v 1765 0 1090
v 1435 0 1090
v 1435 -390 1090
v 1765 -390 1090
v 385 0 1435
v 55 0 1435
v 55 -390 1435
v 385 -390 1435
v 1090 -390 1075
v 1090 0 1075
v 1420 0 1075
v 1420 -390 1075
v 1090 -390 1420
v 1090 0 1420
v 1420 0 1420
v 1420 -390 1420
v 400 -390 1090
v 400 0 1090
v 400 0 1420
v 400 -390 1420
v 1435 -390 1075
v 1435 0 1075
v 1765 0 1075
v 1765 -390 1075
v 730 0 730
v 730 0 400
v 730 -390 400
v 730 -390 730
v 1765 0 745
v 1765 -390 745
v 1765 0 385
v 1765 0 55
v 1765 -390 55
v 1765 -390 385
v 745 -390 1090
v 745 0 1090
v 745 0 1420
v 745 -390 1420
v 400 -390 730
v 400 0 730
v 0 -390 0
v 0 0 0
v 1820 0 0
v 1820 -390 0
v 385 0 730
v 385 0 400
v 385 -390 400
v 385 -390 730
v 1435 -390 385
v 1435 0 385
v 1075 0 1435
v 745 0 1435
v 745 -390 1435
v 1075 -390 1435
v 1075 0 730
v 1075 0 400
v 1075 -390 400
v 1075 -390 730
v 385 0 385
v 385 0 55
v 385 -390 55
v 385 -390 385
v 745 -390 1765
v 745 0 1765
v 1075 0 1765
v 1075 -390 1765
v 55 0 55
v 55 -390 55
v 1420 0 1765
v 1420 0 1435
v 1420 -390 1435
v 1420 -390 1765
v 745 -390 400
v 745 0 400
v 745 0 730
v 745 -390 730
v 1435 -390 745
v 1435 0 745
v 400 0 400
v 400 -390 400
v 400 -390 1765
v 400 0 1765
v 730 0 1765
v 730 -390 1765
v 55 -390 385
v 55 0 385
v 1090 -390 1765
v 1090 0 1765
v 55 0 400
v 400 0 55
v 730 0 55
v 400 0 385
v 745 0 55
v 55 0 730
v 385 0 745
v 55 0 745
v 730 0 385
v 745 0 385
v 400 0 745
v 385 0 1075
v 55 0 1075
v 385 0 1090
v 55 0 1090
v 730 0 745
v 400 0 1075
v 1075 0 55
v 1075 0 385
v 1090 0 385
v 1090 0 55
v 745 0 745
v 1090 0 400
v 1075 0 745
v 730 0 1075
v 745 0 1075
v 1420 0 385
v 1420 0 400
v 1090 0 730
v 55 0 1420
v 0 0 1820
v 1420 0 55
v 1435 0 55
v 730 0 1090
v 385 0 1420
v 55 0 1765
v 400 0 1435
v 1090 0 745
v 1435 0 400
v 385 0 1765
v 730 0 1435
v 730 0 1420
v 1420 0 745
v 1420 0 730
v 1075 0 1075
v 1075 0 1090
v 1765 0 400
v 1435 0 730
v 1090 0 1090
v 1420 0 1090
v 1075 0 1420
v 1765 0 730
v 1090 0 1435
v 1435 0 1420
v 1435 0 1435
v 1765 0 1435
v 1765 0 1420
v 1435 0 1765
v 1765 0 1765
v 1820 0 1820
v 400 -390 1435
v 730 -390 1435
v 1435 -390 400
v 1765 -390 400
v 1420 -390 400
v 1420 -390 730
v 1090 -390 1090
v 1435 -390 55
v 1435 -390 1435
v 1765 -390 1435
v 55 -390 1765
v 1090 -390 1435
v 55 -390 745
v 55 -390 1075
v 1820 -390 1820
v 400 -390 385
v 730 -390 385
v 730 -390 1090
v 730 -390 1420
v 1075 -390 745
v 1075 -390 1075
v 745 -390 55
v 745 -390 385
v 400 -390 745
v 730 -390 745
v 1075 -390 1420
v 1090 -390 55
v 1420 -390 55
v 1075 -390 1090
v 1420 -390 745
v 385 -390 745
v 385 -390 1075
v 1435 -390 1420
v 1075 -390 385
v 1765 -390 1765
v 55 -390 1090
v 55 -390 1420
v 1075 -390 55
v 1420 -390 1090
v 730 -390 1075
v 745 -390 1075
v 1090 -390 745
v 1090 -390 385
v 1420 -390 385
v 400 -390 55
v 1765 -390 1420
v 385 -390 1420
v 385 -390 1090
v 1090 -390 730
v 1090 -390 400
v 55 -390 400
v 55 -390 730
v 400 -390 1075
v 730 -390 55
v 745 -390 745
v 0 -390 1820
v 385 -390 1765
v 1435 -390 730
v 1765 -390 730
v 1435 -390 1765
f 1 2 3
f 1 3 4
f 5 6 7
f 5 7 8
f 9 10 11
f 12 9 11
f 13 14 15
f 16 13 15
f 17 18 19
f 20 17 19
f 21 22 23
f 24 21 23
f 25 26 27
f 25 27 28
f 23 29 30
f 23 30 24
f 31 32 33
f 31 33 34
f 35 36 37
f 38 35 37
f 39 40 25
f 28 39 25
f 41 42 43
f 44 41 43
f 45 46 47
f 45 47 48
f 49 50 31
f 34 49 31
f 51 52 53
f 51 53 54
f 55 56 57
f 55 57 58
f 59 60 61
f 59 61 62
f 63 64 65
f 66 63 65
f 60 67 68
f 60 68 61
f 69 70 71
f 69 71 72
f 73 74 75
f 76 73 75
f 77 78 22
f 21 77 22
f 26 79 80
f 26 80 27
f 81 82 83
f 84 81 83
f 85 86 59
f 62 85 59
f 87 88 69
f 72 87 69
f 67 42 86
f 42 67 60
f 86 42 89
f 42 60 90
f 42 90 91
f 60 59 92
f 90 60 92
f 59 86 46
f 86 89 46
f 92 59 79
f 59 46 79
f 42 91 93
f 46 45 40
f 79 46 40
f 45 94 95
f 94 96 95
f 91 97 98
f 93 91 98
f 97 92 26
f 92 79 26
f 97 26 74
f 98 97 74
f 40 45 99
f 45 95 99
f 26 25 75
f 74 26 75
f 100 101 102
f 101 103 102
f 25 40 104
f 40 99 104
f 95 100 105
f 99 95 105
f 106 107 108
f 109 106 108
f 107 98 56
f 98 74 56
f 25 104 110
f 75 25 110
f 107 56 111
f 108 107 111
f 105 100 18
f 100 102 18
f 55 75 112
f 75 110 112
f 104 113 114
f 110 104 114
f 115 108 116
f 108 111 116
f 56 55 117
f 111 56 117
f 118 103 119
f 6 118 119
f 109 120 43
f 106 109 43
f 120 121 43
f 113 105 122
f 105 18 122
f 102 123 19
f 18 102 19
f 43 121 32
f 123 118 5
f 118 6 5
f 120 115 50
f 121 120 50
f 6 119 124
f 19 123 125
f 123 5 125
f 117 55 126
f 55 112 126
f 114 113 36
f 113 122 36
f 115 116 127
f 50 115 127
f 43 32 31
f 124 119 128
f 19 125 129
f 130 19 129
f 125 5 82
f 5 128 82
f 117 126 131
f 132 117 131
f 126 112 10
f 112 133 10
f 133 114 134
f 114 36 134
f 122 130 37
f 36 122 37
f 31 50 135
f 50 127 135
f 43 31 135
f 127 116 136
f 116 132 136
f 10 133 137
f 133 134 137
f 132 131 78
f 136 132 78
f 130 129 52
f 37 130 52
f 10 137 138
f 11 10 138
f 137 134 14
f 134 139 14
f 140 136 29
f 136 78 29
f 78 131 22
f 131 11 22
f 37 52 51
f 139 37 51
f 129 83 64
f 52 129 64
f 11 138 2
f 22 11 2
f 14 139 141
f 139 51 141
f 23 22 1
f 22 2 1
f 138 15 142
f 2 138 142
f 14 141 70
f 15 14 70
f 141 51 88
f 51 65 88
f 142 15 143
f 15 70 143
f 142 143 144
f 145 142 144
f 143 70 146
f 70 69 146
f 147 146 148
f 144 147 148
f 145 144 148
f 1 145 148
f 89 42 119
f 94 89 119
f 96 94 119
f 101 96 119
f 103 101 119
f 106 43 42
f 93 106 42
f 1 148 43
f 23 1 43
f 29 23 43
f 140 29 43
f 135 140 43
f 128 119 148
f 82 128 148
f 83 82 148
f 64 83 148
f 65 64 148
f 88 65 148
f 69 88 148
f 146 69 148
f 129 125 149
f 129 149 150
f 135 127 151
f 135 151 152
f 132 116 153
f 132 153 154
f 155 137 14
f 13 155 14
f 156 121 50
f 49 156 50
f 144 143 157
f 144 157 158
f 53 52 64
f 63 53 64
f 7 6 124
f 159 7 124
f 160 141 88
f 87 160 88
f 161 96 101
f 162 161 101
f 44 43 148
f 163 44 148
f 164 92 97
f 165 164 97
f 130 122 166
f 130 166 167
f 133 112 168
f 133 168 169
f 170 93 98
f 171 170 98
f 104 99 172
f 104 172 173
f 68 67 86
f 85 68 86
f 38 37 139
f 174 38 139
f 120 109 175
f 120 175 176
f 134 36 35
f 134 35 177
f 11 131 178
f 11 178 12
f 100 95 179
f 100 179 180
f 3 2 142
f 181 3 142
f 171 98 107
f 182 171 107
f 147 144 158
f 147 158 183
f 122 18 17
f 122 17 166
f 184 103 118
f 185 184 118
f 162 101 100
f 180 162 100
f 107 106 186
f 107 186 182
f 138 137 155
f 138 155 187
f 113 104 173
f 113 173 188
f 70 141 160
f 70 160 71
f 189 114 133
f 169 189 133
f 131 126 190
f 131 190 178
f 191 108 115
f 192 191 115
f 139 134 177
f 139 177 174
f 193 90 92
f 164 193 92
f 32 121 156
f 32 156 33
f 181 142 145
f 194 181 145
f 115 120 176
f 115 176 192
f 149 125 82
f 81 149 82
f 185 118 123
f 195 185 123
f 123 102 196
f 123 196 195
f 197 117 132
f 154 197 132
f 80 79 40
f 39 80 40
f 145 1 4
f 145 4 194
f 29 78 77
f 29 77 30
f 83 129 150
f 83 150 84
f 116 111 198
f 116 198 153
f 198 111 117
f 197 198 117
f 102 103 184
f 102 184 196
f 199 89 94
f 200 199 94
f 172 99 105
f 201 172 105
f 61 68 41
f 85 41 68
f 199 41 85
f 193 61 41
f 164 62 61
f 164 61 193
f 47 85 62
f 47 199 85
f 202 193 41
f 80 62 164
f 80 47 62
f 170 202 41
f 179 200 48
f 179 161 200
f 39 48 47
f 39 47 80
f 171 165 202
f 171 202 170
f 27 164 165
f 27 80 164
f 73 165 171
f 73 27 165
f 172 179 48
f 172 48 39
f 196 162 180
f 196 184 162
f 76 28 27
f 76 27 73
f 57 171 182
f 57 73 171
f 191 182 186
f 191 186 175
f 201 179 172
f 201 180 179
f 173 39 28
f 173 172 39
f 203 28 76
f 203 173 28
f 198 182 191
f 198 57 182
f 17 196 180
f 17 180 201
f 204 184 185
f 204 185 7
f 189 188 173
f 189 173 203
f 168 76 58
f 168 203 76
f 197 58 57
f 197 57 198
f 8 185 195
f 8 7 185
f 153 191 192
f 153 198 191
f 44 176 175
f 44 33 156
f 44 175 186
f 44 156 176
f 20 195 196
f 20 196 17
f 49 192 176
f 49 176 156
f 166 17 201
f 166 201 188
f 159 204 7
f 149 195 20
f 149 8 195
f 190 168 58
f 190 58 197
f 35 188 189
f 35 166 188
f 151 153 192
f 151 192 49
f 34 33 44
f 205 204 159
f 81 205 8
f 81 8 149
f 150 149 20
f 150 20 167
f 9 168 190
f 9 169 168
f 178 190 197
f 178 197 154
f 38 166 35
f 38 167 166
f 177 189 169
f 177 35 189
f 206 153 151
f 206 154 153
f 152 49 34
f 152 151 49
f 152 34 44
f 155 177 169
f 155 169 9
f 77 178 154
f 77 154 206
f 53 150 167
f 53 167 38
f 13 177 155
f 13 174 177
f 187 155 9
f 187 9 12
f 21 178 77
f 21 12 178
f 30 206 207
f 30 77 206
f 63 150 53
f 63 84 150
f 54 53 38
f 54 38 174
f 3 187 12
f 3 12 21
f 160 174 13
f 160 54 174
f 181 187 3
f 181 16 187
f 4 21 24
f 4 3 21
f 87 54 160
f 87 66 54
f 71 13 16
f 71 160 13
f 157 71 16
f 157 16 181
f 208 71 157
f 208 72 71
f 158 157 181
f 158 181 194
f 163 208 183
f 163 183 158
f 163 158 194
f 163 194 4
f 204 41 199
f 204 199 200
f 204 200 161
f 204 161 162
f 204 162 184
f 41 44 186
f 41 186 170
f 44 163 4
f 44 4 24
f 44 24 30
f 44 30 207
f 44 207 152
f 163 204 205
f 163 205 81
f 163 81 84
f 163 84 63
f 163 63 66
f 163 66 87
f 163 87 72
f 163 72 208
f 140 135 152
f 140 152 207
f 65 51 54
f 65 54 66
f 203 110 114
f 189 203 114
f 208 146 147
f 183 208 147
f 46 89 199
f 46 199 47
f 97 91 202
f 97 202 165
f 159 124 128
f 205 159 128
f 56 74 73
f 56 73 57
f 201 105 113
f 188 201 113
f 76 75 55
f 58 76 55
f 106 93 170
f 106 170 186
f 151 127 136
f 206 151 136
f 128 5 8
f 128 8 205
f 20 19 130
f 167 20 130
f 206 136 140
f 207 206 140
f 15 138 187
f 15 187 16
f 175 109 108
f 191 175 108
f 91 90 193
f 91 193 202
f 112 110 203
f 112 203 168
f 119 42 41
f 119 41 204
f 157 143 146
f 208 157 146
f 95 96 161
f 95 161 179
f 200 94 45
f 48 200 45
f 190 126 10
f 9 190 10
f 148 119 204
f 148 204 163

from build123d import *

# Parameters (mm, degrees)
F0_W     = 1820
F0_H     = 1820
F1_DEPTH = 390
F2_W     = 330
F2_H     = 330
F3_DEPTH = 740.61349


with BuildPart() as f1:
    # F0 (on Front) → F1 (new body)
    with BuildSketch(Plane.XZ):
        with Locations((910, 910)):
            Rectangle(F0_W, F0_H)
    extrude(amount=F1_DEPTH)

    # F2 (on Front) → F3 (cut)
    with BuildSketch(Plane.XZ):
        with Locations((220, 220)):
            Rectangle(F2_W, F2_H)
        with Locations((220, 565)):
            Rectangle(F2_W, F2_H)
        with Locations((220, 910)):
            Rectangle(F2_W, F2_H)
        with Locations((220, 1255)):
            Rectangle(F2_W, F2_H)
        with Locations((220, 1600)):
            Rectangle(F2_W, F2_H)
        with Locations((565, 220)):
            Rectangle(F2_W, F2_H)
        with Locations((565, 565)):
            Rectangle(F2_W, F2_H)
        with Locations((565, 910)):
            Rectangle(F2_W, F2_H)
        with Locations((565, 1255)):
            Rectangle(F2_W, F2_H)
        with Locations((565, 1600)):
            Rectangle(F2_W, F2_H)
        with Locations((910, 220)):
            Rectangle(F2_W, F2_H)
        with Locations((910, 565)):
            Rectangle(F2_W, F2_H)
        with Locations((910, 910)):
            Rectangle(F2_W, F2_H)
        with Locations((910, 1255)):
            Rectangle(F2_W, F2_H)
        with Locations((910, 1600)):
            Rectangle(F2_W, F2_H)
        with Locations((1255, 220)):
            Rectangle(F2_W, F2_H)
        with Locations((1255, 565)):
            Rectangle(F2_W, F2_H)
        with Locations((1255, 910)):
            Rectangle(F2_W, F2_H)
        with Locations((1255, 1255)):
            Rectangle(F2_W, F2_H)
        with Locations((1255, 1600)):
            Rectangle(F2_W, F2_H)
        with Locations((1600, 220)):
            Rectangle(F2_W, F2_H)
        with Locations((1600, 565)):
            Rectangle(F2_W, F2_H)
        with Locations((1600, 910)):
            Rectangle(F2_W, F2_H)
        with Locations((1600, 1255)):
            Rectangle(F2_W, F2_H)
        with Locations((1600, 1600)):
            Rectangle(F2_W, F2_H)
    extrude(amount=F3_DEPTH, mode=Mode.SUBTRACT)


solid = f1.part
